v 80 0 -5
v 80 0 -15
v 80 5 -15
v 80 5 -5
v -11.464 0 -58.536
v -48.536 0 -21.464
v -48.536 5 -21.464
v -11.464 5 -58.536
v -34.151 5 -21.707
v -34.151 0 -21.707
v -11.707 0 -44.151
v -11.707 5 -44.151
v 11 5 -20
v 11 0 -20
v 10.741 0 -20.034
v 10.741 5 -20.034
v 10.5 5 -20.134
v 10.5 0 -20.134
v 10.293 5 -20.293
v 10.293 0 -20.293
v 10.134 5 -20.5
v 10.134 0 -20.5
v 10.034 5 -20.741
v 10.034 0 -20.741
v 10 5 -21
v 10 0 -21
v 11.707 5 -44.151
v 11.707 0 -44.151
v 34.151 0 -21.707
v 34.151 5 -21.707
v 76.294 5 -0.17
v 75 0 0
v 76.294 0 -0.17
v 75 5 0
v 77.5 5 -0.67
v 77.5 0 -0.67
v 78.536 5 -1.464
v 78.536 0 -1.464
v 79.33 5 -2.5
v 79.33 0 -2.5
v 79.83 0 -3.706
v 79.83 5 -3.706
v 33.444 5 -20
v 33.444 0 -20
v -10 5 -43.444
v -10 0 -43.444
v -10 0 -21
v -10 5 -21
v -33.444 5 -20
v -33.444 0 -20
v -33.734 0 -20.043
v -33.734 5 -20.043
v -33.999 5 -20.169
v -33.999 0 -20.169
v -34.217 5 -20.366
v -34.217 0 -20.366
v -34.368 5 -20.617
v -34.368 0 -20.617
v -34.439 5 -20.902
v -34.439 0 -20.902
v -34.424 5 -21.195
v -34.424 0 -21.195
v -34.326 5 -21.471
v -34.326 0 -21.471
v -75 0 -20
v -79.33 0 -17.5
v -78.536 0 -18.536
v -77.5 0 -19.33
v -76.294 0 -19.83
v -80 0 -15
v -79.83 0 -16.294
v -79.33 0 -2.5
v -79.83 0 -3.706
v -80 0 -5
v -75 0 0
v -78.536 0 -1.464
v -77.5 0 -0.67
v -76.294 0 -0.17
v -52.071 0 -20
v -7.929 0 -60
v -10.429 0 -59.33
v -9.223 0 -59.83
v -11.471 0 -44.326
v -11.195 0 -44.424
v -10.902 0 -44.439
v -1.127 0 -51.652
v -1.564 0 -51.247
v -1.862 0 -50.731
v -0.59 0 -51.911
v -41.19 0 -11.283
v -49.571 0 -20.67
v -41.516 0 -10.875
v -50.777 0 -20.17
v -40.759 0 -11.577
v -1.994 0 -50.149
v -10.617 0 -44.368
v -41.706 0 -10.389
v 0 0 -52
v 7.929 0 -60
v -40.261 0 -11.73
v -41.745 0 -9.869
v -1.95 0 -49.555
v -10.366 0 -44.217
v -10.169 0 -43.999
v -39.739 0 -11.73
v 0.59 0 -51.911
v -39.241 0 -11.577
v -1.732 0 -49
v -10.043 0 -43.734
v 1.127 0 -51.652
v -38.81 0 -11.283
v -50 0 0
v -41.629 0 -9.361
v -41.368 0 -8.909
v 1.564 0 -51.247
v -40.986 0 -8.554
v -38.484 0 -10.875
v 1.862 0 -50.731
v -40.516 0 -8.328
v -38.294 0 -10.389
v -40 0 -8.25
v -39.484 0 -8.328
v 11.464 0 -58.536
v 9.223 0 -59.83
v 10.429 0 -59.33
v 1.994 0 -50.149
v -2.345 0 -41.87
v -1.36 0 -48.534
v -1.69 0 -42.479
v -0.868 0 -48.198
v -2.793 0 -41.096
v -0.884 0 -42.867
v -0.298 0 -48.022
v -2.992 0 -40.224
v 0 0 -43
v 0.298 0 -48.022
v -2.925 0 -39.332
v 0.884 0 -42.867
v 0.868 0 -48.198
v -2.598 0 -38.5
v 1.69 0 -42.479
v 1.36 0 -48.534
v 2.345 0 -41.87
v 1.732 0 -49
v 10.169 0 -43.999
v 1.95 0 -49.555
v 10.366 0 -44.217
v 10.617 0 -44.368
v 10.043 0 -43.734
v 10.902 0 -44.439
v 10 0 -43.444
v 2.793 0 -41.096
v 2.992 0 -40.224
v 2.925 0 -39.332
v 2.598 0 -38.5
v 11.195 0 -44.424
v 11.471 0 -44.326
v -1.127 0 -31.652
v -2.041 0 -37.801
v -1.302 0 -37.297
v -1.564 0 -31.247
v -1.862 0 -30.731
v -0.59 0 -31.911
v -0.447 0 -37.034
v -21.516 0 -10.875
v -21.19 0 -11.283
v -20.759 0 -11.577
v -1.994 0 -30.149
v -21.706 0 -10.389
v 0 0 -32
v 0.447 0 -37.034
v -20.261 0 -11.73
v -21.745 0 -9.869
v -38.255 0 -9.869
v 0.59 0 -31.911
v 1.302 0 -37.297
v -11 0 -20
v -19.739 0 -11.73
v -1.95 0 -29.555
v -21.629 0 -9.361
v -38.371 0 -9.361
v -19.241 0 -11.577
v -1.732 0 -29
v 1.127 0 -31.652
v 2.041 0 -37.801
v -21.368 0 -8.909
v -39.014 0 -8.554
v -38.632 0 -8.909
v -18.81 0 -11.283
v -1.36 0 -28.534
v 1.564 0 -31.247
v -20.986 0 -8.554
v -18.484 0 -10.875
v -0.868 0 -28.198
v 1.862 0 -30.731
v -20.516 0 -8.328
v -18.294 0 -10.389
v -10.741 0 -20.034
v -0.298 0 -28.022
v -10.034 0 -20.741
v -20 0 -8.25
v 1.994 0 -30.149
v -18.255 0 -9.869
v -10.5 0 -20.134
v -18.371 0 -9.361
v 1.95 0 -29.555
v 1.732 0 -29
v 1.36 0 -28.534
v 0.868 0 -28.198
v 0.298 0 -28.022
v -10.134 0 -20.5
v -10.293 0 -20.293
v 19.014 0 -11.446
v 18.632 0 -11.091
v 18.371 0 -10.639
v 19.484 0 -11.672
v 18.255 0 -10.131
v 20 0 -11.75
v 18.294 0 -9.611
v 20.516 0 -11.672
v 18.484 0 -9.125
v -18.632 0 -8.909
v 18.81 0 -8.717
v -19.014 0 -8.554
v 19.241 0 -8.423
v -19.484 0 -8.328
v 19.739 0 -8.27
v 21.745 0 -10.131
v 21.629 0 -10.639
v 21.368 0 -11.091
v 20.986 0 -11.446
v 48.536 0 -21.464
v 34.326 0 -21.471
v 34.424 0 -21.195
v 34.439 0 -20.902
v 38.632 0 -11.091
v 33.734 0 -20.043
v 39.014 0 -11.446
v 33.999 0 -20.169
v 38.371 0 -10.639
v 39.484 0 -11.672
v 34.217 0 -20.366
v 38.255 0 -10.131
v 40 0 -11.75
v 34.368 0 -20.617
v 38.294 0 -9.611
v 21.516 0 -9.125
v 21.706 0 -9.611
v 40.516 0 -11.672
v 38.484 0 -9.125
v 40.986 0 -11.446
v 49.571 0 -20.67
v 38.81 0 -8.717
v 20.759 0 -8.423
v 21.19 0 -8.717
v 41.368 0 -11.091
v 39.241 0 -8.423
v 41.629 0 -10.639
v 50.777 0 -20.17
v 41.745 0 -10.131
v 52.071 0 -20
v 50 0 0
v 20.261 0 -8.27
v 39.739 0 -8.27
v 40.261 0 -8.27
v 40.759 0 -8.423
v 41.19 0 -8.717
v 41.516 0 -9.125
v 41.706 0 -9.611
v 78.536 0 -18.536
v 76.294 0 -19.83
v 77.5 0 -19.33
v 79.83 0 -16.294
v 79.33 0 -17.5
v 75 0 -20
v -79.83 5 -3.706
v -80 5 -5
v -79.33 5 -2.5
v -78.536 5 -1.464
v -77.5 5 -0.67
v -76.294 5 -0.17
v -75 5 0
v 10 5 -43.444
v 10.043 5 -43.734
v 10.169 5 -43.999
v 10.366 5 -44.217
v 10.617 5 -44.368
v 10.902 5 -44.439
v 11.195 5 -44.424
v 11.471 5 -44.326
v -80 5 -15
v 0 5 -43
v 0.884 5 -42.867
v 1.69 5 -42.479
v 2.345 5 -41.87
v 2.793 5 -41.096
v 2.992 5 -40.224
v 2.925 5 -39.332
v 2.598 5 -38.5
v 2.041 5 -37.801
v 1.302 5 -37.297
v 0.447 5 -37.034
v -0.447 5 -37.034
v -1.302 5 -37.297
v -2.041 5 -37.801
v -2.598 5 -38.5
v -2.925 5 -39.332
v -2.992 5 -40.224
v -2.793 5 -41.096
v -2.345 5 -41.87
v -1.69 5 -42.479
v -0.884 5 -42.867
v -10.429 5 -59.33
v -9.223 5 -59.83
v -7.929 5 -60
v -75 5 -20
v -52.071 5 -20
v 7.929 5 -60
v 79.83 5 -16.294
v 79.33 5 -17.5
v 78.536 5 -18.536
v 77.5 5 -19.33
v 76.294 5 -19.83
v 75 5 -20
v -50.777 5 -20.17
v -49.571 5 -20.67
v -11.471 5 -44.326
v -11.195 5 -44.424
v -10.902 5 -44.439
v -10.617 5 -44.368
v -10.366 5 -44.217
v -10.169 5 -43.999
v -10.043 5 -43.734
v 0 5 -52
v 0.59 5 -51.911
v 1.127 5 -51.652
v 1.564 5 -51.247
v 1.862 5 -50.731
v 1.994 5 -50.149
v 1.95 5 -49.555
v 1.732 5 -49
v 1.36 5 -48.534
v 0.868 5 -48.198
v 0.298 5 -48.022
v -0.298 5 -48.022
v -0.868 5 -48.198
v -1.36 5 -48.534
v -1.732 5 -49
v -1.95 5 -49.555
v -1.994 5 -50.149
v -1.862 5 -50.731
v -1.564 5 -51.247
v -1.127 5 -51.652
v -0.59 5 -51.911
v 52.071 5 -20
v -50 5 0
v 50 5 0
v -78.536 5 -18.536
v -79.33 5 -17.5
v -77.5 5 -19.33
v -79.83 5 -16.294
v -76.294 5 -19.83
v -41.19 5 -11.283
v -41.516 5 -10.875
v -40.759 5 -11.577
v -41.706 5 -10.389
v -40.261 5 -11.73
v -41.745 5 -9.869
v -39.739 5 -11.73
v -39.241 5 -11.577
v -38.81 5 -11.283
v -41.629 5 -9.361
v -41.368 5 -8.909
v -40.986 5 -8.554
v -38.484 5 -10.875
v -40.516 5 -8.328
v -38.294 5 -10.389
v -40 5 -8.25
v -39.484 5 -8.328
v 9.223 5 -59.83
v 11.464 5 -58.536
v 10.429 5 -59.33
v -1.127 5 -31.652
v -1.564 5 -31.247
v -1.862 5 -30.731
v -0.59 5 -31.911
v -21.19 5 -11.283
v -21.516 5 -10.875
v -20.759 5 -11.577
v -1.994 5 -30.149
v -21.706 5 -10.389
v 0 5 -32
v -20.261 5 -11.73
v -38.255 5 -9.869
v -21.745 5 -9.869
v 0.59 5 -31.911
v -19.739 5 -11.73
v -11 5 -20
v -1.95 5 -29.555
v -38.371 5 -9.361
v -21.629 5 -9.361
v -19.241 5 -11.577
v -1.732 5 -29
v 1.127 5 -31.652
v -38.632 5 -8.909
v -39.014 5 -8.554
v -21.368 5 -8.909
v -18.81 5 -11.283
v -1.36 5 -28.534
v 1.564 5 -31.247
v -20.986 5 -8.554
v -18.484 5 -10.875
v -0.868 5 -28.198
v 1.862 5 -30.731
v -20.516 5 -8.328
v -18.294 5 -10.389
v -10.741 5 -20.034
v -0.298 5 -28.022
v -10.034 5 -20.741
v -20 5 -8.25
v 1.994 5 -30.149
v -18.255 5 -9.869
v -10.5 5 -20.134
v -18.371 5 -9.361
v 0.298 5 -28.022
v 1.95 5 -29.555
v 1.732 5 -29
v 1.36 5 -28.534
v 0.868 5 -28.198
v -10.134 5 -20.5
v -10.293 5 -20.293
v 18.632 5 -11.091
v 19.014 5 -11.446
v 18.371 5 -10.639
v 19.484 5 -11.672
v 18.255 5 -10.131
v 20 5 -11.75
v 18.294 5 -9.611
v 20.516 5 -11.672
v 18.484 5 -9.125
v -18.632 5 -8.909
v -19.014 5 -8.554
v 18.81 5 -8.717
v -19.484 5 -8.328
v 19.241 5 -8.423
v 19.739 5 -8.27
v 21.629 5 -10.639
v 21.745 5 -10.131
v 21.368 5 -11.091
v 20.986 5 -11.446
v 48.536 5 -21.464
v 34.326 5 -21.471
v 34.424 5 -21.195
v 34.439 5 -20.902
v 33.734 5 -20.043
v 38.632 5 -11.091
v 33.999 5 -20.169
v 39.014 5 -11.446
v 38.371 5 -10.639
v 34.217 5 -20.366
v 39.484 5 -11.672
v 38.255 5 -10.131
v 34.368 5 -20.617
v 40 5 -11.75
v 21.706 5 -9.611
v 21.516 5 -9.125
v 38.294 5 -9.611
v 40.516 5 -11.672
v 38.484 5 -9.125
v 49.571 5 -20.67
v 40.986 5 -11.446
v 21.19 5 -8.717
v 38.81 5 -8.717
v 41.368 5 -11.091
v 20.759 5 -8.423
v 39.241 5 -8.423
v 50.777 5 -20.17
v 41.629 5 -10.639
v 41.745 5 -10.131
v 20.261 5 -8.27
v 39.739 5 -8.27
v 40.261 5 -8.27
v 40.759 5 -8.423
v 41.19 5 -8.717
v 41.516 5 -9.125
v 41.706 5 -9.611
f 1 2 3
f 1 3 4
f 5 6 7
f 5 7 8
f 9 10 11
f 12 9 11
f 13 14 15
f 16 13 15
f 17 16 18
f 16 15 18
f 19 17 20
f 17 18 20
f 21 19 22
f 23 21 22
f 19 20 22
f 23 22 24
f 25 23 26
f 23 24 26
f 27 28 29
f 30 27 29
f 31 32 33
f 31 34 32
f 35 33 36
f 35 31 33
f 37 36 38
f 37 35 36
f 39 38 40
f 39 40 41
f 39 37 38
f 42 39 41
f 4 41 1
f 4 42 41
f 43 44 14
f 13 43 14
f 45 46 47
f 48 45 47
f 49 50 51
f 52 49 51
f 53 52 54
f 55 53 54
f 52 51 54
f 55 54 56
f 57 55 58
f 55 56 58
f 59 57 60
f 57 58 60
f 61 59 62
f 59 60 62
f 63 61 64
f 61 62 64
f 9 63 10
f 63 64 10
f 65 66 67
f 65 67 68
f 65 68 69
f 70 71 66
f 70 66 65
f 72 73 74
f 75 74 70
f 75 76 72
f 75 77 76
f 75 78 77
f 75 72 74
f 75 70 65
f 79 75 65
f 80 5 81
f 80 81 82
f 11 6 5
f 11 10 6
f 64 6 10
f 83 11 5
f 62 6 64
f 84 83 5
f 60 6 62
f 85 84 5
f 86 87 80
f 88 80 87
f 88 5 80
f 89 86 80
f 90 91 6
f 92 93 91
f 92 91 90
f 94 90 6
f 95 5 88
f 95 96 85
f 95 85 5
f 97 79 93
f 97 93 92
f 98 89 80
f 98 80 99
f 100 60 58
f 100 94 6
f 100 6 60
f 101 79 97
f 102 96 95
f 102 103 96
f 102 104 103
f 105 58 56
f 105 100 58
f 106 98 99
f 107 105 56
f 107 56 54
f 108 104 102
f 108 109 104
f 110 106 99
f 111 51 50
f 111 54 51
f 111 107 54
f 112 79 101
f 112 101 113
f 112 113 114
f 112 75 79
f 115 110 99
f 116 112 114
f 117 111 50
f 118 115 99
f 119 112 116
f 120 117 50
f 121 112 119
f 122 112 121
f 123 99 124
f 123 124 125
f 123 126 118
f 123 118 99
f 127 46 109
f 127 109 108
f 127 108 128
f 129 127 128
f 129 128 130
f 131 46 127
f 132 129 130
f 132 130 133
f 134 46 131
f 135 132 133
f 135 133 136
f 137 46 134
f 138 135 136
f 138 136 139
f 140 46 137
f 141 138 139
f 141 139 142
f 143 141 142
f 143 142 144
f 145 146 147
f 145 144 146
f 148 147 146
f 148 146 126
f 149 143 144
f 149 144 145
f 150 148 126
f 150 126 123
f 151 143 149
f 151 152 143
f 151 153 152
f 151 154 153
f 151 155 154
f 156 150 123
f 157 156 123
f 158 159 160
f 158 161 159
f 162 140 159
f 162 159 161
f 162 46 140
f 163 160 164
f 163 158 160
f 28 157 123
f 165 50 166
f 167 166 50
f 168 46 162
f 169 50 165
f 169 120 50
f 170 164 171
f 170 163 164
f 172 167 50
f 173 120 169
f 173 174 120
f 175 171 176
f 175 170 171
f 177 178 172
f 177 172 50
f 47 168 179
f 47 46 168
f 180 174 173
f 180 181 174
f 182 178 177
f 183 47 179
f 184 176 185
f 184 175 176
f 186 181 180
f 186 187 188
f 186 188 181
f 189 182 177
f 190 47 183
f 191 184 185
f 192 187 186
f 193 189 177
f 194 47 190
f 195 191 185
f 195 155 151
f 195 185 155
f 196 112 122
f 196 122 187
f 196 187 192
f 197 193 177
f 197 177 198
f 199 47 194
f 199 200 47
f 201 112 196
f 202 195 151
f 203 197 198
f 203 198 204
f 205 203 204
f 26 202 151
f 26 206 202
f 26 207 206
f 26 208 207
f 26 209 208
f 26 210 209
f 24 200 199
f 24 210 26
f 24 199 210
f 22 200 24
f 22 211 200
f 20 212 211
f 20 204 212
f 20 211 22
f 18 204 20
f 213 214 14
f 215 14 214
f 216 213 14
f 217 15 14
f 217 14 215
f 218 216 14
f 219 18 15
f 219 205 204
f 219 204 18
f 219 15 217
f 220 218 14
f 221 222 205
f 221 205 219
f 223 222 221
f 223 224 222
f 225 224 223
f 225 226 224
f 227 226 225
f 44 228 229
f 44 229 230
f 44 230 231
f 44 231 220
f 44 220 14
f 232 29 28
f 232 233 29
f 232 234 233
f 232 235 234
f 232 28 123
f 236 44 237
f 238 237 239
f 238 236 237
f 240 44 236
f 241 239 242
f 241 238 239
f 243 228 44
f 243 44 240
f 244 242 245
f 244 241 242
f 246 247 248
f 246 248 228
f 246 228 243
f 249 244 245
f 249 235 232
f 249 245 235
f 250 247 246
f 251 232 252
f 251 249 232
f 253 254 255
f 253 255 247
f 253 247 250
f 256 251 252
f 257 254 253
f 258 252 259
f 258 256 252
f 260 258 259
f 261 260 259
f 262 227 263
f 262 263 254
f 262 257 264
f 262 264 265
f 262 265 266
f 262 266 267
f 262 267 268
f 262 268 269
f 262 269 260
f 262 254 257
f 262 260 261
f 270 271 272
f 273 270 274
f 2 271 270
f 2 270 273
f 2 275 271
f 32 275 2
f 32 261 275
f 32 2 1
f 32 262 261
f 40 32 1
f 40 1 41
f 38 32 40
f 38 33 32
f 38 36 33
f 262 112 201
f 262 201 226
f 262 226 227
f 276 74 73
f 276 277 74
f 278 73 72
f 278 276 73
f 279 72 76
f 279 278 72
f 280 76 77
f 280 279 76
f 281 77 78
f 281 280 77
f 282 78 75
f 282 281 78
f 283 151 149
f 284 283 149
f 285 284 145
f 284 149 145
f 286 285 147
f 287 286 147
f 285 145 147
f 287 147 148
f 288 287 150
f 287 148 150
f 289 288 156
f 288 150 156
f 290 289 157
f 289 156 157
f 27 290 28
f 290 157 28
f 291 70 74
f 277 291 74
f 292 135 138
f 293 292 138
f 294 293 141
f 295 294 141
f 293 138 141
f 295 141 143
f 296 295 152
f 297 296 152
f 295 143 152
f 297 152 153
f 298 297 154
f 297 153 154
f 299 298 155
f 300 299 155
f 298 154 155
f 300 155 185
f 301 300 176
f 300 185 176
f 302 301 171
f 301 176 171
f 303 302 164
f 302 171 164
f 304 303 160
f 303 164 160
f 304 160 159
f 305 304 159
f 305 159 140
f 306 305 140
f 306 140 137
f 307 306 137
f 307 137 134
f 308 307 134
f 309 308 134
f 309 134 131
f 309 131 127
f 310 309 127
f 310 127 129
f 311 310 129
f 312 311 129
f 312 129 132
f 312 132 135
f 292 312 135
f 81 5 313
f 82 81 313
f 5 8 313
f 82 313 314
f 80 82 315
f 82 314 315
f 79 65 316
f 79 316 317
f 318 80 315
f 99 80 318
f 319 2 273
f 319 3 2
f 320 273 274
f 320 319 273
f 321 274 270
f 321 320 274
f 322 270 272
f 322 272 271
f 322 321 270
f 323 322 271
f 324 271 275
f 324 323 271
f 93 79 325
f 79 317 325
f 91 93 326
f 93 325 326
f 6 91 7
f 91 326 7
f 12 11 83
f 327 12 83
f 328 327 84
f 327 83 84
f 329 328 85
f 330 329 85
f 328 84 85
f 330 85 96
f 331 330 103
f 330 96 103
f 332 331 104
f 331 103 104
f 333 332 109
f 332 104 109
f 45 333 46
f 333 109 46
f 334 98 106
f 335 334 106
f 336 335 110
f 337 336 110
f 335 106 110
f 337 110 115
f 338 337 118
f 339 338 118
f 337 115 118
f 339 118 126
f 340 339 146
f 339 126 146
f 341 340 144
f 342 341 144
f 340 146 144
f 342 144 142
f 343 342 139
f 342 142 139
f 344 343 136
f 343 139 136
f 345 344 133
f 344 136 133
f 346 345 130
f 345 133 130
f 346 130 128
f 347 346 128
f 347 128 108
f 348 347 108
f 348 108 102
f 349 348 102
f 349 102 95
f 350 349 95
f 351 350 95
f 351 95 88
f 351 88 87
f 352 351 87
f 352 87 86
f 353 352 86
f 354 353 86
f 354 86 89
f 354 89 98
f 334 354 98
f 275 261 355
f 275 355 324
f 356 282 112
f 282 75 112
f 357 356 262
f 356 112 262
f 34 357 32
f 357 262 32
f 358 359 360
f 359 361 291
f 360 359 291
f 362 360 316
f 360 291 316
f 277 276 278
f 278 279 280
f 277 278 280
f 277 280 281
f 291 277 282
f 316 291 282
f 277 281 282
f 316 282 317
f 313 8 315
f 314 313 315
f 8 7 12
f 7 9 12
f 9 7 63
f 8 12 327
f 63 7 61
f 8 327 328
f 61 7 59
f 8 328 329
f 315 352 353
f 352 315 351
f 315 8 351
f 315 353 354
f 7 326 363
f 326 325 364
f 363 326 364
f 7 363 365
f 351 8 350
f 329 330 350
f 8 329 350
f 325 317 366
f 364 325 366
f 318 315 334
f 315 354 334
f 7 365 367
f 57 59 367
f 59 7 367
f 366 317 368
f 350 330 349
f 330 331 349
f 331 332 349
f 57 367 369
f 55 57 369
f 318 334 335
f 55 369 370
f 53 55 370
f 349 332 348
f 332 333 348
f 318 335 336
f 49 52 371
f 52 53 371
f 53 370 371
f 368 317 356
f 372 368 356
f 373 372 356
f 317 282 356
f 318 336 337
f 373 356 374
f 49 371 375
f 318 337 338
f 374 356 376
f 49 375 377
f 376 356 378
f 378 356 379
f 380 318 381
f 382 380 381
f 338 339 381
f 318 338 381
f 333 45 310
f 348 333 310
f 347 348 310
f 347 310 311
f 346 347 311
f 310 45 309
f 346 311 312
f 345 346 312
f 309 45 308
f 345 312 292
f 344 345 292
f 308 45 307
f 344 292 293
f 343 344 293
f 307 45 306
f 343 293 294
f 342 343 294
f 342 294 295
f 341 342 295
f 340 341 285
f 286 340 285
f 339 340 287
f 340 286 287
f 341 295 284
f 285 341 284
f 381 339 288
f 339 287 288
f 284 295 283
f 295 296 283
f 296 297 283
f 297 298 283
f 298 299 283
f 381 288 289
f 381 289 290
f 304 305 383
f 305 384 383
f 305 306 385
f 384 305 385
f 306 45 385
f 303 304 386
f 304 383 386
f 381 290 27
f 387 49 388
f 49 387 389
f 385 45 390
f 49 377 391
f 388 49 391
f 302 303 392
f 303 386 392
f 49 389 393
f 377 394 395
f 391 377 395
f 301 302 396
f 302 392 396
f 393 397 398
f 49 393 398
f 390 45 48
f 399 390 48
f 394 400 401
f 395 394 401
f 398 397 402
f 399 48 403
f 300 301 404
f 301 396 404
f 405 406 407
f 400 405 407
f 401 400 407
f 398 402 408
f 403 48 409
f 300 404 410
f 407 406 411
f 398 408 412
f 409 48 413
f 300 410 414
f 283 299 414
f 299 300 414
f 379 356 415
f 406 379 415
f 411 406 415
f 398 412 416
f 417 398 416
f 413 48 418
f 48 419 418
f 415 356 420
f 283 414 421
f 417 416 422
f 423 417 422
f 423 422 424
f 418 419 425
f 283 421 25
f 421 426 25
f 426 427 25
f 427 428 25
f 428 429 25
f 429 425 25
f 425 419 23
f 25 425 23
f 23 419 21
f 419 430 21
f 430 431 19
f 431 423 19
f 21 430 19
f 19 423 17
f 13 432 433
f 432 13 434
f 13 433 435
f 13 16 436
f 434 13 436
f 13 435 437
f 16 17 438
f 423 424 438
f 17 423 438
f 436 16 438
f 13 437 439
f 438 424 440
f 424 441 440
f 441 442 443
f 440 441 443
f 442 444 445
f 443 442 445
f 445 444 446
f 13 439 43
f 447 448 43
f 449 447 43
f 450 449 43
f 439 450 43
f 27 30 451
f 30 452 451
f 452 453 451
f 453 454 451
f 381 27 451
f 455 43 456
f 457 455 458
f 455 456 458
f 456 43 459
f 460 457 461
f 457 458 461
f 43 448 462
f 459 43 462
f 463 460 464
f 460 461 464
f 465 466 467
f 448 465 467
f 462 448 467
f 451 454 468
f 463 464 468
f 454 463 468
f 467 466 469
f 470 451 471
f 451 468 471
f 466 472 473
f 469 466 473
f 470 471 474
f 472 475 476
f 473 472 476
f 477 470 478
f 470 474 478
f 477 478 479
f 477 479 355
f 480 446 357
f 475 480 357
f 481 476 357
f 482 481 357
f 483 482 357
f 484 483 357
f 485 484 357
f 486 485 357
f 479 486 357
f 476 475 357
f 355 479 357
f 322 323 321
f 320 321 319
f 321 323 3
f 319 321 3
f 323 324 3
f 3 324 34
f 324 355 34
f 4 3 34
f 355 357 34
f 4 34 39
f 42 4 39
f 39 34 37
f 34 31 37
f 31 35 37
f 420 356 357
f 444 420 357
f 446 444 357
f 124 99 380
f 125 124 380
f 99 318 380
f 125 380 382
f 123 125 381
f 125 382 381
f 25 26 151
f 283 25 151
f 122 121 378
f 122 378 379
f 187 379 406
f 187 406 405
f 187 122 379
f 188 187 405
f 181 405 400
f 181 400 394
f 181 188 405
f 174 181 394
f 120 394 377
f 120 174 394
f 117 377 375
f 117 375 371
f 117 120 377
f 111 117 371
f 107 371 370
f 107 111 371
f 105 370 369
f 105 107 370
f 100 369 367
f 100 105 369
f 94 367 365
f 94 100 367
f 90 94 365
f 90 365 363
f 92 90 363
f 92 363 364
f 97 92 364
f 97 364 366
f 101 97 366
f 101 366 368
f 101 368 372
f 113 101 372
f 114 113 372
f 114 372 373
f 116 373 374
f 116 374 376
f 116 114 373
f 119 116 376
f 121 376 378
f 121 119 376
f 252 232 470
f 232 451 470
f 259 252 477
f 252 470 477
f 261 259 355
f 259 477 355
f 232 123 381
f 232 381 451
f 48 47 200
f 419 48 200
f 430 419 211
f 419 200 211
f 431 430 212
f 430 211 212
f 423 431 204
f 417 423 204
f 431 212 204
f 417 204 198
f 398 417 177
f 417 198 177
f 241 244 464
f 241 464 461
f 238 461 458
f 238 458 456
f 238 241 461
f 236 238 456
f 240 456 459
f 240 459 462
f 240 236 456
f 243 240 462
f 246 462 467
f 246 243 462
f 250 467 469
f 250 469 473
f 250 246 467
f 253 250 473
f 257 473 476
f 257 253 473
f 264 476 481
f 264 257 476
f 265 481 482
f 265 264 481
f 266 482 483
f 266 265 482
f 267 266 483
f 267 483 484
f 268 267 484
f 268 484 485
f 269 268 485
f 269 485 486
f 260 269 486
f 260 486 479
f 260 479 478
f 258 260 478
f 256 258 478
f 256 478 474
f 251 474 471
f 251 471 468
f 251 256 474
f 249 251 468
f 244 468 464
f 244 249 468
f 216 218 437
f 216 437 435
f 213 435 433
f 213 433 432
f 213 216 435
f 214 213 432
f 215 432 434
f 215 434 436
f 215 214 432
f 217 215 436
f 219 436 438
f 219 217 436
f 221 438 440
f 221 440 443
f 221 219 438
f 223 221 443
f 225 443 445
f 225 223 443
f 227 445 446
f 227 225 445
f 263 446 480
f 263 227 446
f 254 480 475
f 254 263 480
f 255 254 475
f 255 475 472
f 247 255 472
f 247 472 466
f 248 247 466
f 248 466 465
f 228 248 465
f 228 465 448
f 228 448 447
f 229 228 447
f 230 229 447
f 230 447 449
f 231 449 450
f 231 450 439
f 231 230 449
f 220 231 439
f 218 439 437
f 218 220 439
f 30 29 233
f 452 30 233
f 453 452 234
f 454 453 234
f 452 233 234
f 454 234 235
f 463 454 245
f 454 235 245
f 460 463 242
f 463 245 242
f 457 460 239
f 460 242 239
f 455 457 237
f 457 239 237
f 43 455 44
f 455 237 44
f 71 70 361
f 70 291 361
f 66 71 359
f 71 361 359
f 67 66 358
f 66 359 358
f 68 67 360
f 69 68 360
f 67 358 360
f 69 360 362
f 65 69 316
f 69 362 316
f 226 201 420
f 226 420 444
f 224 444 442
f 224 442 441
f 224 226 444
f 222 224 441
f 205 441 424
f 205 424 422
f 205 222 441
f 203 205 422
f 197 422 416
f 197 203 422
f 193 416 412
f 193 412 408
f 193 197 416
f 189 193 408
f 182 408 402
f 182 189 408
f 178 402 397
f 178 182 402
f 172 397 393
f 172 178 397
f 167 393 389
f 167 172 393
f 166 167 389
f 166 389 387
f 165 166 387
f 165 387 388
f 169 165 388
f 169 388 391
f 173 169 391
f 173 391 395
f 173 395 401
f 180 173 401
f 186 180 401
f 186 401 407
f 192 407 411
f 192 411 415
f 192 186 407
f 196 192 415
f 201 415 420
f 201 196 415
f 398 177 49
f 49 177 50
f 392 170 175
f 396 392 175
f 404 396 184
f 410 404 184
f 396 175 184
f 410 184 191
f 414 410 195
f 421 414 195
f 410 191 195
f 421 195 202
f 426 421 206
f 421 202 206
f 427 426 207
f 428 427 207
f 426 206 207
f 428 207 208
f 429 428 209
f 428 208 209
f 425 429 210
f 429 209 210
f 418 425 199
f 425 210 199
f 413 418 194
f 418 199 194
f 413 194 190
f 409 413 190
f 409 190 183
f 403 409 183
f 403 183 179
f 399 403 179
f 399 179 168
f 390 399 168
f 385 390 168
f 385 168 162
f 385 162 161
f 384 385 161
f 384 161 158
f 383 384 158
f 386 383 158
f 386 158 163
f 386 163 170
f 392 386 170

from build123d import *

# Parameters (mm, degrees)
ESBO_O1_R                = 1.75
RESSALTO_EXTRUS_O1_DEPTH = 5
ESBO_O4_W                = 30
ESBO_O4_H                = 20.000002677
RESSALTO_EXTRUS_O3_DEPTH = 5
ESBO_O5_R                = 3
CORTE_EXTRUS_O1_DEPTH    = 101.124923498
ESBO_O6_R                = 1.75
RESSALTO_EXTRUS_O5_DEPTH = 5
FILETE1_R                = 5
ESBO_O7_R                = 2
CORTE_EXTRUS_O2_DEPTH    = 101.124923498


with BuildPart() as part:
    # Esboço1 → Ressalto-extrusão1 (new body)
    with BuildSketch(Plane(origin=(0, 0, 0), x_dir=(1, 0, 0), z_dir=(0, 1, 0))):
        Polygon((-50, 0), (-50, 20.000002677), (-9.999996661, 60.000002546), (9.999996661, 60.000002546), (50, 20.000002677), (50, 0), align=None)
        with Locations(Location((-40, 10.000001339, 0), (0, 0, 270))):
            Circle(ESBO_O1_R, mode=Mode.SUBTRACT)
        with Locations(Location((-20, 10.000001339, 0), (0, 0, 270))):
            Circle(ESBO_O1_R, mode=Mode.SUBTRACT)
        with Locations(Location((0, 50.000002546, 0), (0, 0, 270))):
            Circle(ESBO_O1_R, mode=Mode.SUBTRACT)
        with Locations(Location((0, 30.000002546, 0), (0, 0, 270))):
            Circle(ESBO_O1_R, mode=Mode.SUBTRACT)
        with Locations(Location((20, 10.000001339, 0), (0, 0, 90))):
            Circle(ESBO_O1_R, mode=Mode.SUBTRACT)
        with Locations(Location((40, 10.000001339, 0), (0, 0, 90))):
            Circle(ESBO_O1_R, mode=Mode.SUBTRACT)
        with BuildLine():
            Line((-10, 43.443650782), (-10, 21.000001339))
            ThreePointArc((-10, 21.000001339), (-10.292893219, 20.292894558), (-11, 20.000001339))
            Line((-11, 20.000001339), (-33.443651391, 20.000001339))
            ThreePointArc((-33.443651391, 20.000001339), (-34.367530932, 20.617317926), (-34.150758141, 21.707108151))
            Line((-34.150758141, 21.707108151), (-11.707106751, 44.150757594))
            ThreePointArc((-11.707106751, 44.150757594), (-10.617316548, 44.367530307), (-10, 43.443650782))
        make_face(mode=Mode.SUBTRACT)
        with BuildLine():
            Line((11.707106751, 44.150757594), (34.150758141, 21.707108151))
            ThreePointArc((34.150758141, 21.707108151), (34.367530932, 20.617317926), (33.443651391, 20.000001339))
            Line((33.443651391, 20.000001339), (11, 20.000001339))
            ThreePointArc((11, 20.000001339), (10.292893219, 20.292894558), (10, 21.000001339))
            Line((10, 21.000001339), (10, 43.443650782))
            ThreePointArc((10, 43.443650782), (10.617316548, 44.367530307), (11.707106751, 44.150757594))
        make_face(mode=Mode.SUBTRACT)
    extrude(amount=RESSALTO_EXTRUS_O1_DEPTH)

    # Esboço4 → Ressalto-extrusão3 (add)
    with BuildSketch(Plane.XZ):
        with Locations((-65, -10.000001339)):
            Rectangle(ESBO_O4_W, ESBO_O4_H)
        with Locations((65, -10.000001339)):
            Rectangle(ESBO_O4_W, ESBO_O4_H)
    extrude(amount=-RESSALTO_EXTRUS_O3_DEPTH)

    # Esboço5 → Corte-extrusão1 (cut, through all)
    with BuildSketch(Plane.XZ):
        with Locations(Location((0, -40.000002546, 0), (0, 0, 270))):
            Circle(ESBO_O5_R)
    extrude(amount=-CORTE_EXTRUS_O1_DEPTH, mode=Mode.SUBTRACT)

    # Esboço6 → Ressalto-extrusão5 (add, through all)
    with BuildSketch(Plane.XZ):
        with Locations((0, -30.000002546)):
            Circle(ESBO_O6_R)
        with Locations((0, -50.000002546)):
            Circle(ESBO_O6_R)
    extrude(amount=-RESSALTO_EXTRUS_O5_DEPTH)

    # Filete1
    filete1_edges = [part.edges().sort_by_distance(p)[0] for p in [
        (-50, 2.5, -20.000002677),
        (-9.999996661, 2.5, -60.000002546),
        (9.999996661, 2.5, -60.000002546),
        (50, 2.5, -20.000002677),
        (-80, 2.5, -20.000002677),
        (-80, 2.5, 0),
        (80, 2.5, 0),
        (80, 2.5, -20.000002677),
    ]]
    fillet(filete1_edges, radius=FILETE1_R)

    # Esboço7 → Corte-extrusão2 (cut, through all)
    with BuildSketch(Plane.XZ):
        with Locations(Location((0, -50.000002546, 0), (0, 0, 270))):
            Circle(ESBO_O7_R)
        with Locations(Location((0, -30.000002546, 0), (0, 0, 270))):
            Circle(ESBO_O7_R)
    extrude(amount=-CORTE_EXTRUS_O2_DEPTH, mode=Mode.SUBTRACT)


solid = part.part
